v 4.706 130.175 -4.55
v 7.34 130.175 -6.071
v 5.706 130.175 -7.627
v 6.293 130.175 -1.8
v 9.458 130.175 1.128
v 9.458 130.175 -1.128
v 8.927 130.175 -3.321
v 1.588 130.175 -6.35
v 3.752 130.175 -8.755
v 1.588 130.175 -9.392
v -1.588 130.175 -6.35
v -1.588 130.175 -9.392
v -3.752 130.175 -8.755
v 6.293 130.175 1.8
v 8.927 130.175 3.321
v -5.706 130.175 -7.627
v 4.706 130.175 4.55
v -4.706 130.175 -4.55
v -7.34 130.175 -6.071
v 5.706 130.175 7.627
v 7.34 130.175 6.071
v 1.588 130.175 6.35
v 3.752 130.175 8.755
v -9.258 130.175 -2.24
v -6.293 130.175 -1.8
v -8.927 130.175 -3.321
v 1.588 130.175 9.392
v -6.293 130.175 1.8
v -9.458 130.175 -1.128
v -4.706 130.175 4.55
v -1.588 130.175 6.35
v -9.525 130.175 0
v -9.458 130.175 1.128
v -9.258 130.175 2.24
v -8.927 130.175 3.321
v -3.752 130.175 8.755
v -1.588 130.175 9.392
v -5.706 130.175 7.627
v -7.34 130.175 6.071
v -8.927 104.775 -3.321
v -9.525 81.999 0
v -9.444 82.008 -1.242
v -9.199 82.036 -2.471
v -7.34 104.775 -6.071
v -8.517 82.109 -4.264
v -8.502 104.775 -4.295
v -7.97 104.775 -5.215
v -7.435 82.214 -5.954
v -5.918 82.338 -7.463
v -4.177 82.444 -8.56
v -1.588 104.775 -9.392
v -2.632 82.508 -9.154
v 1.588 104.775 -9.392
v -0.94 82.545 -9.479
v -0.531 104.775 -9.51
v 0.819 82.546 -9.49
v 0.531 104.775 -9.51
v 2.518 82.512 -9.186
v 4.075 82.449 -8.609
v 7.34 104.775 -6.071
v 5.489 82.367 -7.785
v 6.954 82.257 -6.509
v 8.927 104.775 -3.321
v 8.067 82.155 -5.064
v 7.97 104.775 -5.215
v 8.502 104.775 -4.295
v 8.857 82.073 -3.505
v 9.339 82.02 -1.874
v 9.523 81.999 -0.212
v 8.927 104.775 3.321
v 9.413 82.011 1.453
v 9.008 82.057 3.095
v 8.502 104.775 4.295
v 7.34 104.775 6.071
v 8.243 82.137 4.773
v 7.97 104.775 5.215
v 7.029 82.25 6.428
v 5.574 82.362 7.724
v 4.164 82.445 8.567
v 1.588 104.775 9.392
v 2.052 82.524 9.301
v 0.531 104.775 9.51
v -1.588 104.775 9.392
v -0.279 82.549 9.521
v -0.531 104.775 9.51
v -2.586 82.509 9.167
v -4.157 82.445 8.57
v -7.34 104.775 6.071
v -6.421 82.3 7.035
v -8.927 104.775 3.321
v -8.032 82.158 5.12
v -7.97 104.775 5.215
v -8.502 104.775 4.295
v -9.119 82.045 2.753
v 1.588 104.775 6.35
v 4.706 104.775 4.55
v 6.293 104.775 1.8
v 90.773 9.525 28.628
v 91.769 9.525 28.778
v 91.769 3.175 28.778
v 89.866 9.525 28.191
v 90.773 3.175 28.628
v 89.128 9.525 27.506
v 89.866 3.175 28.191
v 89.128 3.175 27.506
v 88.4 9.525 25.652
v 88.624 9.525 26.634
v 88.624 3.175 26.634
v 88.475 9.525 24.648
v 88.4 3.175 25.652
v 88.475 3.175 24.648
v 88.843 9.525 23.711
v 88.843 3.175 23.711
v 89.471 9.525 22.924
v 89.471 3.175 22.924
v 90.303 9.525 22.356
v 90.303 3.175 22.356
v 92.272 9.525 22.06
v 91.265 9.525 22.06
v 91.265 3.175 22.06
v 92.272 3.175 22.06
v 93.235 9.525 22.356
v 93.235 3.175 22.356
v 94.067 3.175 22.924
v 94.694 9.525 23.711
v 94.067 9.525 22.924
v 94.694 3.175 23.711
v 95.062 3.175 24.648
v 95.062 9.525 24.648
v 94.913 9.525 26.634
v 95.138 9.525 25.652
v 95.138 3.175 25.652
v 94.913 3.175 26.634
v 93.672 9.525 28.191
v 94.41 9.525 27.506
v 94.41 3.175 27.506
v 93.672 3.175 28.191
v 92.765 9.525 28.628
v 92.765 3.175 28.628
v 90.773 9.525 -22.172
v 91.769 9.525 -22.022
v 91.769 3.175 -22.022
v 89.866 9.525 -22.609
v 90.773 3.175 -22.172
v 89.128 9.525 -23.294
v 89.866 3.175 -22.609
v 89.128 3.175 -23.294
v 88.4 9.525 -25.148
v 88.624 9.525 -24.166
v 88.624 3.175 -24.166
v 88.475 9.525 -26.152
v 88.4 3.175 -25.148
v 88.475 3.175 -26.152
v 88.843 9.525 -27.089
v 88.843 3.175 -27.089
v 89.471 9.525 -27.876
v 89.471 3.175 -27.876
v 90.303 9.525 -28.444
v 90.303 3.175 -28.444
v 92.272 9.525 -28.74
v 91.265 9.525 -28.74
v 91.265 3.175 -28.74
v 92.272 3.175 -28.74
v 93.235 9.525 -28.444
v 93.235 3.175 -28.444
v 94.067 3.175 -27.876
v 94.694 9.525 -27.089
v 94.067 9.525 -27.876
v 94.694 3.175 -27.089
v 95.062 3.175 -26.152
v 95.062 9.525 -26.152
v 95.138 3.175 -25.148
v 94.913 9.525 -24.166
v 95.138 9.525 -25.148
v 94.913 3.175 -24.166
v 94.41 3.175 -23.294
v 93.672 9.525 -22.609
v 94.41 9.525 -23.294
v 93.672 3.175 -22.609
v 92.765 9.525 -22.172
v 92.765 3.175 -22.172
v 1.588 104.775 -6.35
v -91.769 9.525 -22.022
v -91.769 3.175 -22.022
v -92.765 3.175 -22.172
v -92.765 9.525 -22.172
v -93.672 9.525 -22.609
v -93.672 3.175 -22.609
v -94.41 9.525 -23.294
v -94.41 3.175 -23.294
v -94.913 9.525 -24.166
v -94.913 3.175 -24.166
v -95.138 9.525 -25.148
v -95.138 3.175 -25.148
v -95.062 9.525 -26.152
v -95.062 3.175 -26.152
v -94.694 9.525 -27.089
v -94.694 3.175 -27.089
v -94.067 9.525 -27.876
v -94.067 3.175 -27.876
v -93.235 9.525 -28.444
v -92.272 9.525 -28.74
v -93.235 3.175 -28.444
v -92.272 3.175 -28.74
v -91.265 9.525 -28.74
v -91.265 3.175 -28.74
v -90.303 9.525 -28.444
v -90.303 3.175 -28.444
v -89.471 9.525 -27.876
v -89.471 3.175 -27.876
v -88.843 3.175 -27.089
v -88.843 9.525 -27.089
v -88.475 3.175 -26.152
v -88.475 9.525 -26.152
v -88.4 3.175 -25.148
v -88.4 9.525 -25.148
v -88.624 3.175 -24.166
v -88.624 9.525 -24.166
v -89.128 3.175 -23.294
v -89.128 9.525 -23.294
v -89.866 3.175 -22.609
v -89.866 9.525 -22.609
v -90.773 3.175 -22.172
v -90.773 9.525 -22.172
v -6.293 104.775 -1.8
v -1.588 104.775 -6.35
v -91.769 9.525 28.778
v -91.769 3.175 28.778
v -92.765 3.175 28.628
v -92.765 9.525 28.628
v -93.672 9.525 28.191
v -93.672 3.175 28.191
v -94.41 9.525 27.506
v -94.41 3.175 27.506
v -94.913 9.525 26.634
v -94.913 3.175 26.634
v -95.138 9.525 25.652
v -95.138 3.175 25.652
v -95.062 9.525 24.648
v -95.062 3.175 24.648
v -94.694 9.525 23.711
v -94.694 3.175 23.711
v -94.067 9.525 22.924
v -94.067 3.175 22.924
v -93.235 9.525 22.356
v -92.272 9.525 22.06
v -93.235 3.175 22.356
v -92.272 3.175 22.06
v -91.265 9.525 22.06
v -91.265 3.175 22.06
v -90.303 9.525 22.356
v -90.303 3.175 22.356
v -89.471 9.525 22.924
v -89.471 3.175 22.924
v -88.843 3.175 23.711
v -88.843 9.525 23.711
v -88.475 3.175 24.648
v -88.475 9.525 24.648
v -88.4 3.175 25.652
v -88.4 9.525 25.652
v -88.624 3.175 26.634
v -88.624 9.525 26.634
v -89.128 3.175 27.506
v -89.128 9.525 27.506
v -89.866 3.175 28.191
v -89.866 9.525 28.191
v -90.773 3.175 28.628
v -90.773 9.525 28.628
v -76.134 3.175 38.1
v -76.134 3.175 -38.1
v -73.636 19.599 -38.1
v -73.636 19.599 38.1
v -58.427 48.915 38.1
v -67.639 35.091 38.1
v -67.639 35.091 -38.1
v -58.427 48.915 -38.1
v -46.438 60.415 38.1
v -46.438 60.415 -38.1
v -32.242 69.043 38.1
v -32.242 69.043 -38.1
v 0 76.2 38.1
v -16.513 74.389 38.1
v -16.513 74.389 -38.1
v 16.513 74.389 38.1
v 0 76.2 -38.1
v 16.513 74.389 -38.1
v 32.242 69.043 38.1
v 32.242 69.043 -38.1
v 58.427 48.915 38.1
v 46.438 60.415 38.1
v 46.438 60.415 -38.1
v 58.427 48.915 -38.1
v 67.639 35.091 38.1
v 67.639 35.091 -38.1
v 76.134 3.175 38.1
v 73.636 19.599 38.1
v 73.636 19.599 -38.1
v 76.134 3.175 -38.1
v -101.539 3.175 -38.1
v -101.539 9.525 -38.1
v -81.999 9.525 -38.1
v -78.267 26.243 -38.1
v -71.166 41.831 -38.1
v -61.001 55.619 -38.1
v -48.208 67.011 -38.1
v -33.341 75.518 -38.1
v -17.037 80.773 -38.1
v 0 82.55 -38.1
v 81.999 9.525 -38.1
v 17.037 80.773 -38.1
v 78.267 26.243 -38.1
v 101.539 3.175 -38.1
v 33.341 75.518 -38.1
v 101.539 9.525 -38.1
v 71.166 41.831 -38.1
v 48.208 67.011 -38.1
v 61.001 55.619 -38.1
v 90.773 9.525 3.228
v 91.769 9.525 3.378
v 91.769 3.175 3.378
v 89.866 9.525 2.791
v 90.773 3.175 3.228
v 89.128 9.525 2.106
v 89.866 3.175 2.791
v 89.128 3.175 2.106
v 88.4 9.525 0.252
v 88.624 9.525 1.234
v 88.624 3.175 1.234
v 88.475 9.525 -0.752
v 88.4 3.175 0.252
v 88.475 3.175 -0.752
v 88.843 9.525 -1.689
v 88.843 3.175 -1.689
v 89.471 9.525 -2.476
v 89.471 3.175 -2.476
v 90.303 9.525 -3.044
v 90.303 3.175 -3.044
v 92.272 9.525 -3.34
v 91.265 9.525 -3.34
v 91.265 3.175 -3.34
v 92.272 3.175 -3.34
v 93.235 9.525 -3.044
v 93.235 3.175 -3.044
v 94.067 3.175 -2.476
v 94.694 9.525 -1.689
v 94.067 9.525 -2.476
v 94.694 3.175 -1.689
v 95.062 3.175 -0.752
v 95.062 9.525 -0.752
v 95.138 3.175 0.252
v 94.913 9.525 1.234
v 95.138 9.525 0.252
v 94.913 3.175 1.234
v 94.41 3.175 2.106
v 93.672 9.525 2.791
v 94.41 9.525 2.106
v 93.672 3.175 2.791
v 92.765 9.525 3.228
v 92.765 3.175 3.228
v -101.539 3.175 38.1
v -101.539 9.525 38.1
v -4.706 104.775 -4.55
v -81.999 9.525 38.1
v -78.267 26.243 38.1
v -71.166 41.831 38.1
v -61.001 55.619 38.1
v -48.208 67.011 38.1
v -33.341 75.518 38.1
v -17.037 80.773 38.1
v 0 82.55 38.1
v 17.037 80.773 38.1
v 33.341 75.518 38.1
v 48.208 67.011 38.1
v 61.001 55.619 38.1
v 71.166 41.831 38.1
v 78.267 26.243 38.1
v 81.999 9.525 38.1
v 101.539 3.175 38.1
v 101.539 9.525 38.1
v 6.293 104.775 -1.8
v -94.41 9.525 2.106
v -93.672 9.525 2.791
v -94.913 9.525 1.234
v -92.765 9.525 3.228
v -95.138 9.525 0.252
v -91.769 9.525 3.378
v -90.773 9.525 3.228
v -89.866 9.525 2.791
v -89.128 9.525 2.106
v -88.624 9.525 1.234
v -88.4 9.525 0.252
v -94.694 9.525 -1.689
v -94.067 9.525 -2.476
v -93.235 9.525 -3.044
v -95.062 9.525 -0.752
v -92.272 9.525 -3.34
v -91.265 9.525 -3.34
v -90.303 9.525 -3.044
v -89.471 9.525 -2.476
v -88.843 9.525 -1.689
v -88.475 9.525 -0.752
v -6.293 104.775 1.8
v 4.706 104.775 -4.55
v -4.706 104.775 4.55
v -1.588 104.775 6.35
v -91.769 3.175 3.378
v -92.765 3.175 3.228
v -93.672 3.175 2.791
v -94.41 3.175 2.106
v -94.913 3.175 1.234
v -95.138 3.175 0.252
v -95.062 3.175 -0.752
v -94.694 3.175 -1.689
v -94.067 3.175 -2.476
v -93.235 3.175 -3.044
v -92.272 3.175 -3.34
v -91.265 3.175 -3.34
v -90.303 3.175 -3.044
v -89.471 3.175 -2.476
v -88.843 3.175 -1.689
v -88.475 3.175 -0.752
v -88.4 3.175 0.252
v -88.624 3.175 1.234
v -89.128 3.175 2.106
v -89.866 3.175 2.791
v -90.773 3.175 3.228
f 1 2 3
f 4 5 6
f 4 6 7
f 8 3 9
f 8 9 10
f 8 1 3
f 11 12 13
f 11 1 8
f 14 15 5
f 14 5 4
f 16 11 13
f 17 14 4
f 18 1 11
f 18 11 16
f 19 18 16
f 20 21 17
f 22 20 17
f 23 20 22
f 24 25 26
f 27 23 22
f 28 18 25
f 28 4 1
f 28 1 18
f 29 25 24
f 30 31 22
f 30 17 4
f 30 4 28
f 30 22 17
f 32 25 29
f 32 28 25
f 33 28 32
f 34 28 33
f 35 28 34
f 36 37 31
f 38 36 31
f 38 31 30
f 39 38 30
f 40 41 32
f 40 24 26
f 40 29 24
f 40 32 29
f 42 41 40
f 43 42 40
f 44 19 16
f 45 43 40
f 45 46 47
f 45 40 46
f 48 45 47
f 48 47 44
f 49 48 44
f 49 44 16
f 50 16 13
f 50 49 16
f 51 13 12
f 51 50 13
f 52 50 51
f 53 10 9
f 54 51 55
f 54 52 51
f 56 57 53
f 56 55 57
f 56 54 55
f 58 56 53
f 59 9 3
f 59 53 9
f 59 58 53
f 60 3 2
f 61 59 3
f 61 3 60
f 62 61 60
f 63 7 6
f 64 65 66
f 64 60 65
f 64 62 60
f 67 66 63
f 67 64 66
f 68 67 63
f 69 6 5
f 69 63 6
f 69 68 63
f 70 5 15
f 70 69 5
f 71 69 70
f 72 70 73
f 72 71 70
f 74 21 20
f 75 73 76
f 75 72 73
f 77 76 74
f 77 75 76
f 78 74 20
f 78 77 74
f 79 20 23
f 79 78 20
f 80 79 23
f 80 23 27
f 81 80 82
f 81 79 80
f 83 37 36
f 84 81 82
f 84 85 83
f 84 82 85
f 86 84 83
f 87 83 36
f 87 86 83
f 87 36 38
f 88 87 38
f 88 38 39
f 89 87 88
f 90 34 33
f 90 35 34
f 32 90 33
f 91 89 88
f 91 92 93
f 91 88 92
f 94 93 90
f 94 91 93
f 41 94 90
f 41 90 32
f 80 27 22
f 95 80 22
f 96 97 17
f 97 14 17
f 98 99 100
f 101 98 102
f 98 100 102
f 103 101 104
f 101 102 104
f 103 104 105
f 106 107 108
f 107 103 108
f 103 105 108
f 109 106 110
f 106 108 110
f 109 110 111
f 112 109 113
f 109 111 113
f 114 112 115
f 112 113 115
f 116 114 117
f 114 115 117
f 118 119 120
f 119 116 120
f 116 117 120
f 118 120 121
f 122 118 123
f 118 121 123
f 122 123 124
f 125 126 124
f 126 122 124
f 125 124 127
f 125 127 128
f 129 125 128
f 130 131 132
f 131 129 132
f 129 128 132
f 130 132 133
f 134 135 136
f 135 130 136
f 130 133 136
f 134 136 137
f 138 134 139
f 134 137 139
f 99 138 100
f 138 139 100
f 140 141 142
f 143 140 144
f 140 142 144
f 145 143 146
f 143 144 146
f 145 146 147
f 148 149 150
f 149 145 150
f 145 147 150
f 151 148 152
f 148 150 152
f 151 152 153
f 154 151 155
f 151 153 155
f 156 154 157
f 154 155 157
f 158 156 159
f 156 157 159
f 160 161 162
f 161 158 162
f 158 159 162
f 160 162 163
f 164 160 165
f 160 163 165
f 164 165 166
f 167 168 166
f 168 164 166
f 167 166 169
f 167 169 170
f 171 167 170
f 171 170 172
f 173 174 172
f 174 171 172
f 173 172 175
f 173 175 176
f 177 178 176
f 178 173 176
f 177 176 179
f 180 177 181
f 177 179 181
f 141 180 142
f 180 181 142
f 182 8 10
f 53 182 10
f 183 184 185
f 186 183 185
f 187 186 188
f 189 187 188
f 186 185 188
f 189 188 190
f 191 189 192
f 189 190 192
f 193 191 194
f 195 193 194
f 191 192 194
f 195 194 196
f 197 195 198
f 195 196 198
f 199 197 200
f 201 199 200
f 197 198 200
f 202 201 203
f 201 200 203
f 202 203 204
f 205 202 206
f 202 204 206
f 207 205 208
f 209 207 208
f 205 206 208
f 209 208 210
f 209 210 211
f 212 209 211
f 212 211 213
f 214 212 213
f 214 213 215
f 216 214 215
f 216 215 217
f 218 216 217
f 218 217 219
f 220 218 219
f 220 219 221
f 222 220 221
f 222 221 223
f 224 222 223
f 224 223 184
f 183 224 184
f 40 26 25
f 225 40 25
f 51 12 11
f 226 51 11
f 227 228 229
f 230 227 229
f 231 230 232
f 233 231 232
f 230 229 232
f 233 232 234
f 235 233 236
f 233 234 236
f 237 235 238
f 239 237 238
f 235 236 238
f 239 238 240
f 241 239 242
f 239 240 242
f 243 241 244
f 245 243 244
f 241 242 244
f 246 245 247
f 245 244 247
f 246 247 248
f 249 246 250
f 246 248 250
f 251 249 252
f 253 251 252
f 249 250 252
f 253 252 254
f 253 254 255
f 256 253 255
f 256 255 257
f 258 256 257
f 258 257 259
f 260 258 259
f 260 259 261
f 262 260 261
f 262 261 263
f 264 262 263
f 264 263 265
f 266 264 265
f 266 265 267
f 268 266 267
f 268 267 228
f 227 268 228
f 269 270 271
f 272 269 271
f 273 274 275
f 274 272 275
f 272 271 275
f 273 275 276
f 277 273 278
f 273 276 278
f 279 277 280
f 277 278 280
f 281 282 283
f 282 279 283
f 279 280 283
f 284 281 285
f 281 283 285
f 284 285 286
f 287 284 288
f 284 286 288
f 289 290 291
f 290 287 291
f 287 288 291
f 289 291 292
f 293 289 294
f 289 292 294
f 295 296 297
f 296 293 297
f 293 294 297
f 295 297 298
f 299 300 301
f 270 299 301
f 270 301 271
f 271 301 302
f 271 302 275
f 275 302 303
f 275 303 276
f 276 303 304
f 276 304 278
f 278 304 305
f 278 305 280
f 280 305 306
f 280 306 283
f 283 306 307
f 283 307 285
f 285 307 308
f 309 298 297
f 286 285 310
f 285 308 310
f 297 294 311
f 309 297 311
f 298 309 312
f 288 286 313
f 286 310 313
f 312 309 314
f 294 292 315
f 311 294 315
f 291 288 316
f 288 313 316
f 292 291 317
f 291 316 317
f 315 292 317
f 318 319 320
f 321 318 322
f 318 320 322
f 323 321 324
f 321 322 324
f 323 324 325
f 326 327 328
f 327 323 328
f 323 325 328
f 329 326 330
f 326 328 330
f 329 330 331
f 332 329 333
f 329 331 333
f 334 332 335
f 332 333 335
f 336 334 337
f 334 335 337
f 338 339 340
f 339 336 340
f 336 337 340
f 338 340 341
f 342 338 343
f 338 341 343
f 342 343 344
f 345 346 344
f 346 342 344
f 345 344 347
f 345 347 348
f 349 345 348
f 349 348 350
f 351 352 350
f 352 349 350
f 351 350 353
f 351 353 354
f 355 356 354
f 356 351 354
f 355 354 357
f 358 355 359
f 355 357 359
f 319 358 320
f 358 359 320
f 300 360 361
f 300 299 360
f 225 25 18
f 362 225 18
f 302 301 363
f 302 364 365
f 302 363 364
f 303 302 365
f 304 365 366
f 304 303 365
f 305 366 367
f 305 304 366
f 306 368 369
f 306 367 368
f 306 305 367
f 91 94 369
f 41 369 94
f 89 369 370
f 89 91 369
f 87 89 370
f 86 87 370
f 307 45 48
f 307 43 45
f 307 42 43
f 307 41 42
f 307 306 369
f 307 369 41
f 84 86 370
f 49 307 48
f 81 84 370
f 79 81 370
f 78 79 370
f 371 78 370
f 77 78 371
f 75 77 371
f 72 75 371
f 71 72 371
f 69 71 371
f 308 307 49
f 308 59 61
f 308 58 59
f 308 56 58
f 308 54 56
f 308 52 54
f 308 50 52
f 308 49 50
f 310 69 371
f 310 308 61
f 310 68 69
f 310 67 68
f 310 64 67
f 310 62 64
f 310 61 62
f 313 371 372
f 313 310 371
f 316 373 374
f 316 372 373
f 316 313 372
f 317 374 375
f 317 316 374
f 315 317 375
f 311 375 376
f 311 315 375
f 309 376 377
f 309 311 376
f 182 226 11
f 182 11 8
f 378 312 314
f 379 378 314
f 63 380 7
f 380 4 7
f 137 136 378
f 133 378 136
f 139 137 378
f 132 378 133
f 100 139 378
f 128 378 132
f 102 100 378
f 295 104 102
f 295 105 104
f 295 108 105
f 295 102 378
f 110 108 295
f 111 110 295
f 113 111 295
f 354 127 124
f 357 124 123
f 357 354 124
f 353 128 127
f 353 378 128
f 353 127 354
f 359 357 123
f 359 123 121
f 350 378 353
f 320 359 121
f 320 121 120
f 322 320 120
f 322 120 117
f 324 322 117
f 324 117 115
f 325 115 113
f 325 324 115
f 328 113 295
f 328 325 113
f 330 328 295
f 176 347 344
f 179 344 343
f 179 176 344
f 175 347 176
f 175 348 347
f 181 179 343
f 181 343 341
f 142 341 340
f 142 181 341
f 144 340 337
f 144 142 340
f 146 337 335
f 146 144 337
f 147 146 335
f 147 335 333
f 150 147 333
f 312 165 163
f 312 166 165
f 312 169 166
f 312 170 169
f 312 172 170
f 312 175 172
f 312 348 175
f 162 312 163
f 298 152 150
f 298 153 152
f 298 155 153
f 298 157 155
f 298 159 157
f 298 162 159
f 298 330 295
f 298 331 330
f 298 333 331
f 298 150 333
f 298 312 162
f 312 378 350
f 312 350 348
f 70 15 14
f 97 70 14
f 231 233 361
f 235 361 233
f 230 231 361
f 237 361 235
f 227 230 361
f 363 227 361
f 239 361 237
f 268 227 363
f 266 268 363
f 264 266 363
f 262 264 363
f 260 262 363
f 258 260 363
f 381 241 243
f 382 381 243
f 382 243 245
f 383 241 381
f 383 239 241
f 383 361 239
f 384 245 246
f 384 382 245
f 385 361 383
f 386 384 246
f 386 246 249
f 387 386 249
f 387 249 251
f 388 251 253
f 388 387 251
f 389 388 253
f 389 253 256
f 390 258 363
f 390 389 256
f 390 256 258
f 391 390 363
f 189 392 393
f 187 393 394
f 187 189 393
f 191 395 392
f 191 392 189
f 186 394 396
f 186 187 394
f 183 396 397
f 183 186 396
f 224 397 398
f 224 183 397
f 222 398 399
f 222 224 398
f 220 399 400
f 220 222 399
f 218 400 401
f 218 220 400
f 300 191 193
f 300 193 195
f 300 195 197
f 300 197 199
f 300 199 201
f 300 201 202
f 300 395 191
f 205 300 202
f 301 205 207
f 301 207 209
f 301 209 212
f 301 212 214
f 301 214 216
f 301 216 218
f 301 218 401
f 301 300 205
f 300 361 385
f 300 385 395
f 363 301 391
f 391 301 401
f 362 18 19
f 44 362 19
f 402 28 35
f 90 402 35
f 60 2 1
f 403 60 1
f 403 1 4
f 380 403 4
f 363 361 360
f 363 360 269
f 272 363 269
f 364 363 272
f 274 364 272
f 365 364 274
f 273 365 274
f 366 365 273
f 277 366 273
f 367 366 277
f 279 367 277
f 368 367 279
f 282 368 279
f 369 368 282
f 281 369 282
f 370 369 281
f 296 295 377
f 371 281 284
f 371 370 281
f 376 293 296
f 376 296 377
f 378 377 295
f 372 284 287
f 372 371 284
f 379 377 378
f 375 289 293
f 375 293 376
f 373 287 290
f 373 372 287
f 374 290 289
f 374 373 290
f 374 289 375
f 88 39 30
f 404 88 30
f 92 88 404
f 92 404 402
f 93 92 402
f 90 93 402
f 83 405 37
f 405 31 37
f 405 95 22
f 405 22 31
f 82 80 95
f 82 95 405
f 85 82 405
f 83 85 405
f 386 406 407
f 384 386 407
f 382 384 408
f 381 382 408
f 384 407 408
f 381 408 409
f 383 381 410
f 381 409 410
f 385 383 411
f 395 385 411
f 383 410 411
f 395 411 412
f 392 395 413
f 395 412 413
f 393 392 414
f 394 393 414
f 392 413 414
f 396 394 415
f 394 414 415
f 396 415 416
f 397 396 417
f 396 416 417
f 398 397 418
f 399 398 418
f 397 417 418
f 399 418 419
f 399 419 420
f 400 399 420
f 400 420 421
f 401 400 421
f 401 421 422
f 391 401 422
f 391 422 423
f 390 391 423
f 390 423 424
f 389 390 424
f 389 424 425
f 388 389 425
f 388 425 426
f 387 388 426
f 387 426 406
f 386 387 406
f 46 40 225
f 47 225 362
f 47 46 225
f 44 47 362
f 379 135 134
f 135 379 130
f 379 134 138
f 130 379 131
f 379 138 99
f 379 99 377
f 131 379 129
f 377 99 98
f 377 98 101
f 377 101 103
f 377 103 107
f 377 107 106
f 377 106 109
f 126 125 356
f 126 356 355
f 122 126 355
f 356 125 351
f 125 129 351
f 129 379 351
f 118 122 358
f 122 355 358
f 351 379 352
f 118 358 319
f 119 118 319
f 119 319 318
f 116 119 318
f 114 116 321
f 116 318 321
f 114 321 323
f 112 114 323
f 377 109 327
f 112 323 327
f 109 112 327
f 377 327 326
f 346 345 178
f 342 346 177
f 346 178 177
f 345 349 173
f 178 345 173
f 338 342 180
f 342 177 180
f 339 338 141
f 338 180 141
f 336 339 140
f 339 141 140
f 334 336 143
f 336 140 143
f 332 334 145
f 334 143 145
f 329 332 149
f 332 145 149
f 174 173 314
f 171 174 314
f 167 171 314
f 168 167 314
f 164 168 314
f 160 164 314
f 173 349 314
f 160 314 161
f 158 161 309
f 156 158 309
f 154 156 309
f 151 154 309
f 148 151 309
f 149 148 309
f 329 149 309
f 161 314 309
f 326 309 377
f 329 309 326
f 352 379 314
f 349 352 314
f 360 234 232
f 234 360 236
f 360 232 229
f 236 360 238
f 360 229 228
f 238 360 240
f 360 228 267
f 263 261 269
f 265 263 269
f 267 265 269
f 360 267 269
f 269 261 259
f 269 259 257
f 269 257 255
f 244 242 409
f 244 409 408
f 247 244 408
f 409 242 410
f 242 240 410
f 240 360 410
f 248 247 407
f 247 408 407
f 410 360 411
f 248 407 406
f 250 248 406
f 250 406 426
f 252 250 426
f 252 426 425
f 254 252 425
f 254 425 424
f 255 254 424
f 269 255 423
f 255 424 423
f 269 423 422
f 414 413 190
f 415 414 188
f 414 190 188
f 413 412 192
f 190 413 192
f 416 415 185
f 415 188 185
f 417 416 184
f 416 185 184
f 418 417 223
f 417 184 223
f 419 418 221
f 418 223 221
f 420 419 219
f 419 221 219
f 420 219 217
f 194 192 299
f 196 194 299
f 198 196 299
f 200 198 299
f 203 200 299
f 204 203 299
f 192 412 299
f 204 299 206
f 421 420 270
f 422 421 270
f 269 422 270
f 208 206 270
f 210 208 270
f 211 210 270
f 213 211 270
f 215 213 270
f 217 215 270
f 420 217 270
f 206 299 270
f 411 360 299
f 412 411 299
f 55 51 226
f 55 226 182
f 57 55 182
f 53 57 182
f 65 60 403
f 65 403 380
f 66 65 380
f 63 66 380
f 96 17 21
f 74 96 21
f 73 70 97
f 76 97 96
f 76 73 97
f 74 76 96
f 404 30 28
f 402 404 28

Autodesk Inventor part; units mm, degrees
ref_plane "YZ Plane" through (0, 0, 0) normal (1, 0, 0) x (0, 1, 0)
ref_plane "XY Plane" through (0, 0, 0) normal (0, 0, 1) x (1, 0, 0)
sketch "Sketch8" plane through (0, 0, 0) normal (0, 0, 1) x (1, 0, 0)
  arc A0 (76.1338, 3.175) -> (-76.1338, 3.175) centre (0, 0) ccw
  arc A1 (81.9986, 9.525) -> (-81.9986, 9.525) centre (0, 0) ccw
  line L0 (-82.4889, 3.175) -> (-101.5389, 3.175)
  line L1 (-101.5389, 3.175) -> (-101.5389, 9.525)
  line L2 (-101.5389, 9.525) -> (-81.9986, 9.525)
  line L3 (0, 0) -> (0, 82.55) construction
  line L4 (-82.4889, 3.175) -> (-76.1338, 3.175)
  line L5 (82.4889, 3.175) -> (101.5389, 3.175)
  line L6 (101.5389, 3.175) -> (101.5389, 9.525)
  line L7 (101.5389, 9.525) -> (81.9986, 9.525)
  line L8 (82.4889, 3.175) -> (76.1338, 3.175)
  dimension "d52" = 152.4
  dimension "d53" = 6.35
  dimension "d54" = 19.05
  dimension "d55" = 3.175
  dimension "d56" = 6.35
extrude "Extrusion5" add sketch "Sketch8" along normal mid plane 76.2
sketch "Sketch9" plane through (-101.5389, 9.525, 38.1) normal (0, 1, 0) x (1, 0, 0)
  line L0 (19.5403, 0) -> (0, 0) construction
  line L1 (9.7701, 0) -> (9.7701, 76.2) construction
  line L2 (25.4051, 76.2) -> (0, 76.2) construction
  line L3 (9.7701, 25.4) -> (9.7701, 101.6) construction
  line L4 (9.7701, 50.8) -> (9.7701, 127) construction
  point P0 (101.5389, 38.1)
  point P1 (9.7701, 12.7)
  point P2 (9.7701, 38.1)
  point P3 (9.7701, 63.5)
  dimension "d59" = 12.7
  dimension "d62" = 25.4
hole "Hole3" at (-91.7688, 9.525, 25.4) at (-91.7688, 9.525, 0) at (-91.7688, 9.525, -25.4) direction (0, -1, 0) diameter 6.7564 end through all clearance for "Socket Head Cap Screw" size "1/4" standard "Ansi Unified Screw Threads"
mirror "Mirror3" about plane through (0, 0, 0) normal (1, 0, 0) of "Hole3"
ref_plane "Work Plane7" through (0, 79.375, 0) normal (0, 1, 0) x (-1, 0, 0)
sketch "Sketch20" plane through (0, 79.375, 0) normal (0, 1, 0) x (-1, 0, 0)
  circle A0 centre (0, 0) radius 9.525
  dimension "d101" = 19.05
extrude "Extrusion11" add sketch "Sketch20" along normal blind 50.8
sketch "Sketch21" plane through (0, 130.175, 0) normal (0, 1, 0) x (1, 0, 0)
  arc A0 (1.5875, 9.3918) -> (-1.5875, 9.3918) centre (0, 0) ccw
  circle A1 centre (0, 0) radius 9.525 projected
  line L0 (-1.5875, 9.3918) -> (-1.5875, 6.35)
  line L1 (-1.5875, 6.35) -> (1.5875, 6.35)
  line L2 (1.5875, 6.35) -> (1.5875, 9.3918)
  dimension "d106" = 3.175
  dimension "d107" = 3.175
extrude "Extrusion12" cut sketch "Sketch21" against normal blind 25.4 contours L2 L1 L0 A0
pattern_circular "Circular Pattern3" count 6 over 360 about axis through (0, -10, 0) along (0, 1, 0) of "Extrusion12"
properties part number "tubeBracket" material "ABS Plastic"
